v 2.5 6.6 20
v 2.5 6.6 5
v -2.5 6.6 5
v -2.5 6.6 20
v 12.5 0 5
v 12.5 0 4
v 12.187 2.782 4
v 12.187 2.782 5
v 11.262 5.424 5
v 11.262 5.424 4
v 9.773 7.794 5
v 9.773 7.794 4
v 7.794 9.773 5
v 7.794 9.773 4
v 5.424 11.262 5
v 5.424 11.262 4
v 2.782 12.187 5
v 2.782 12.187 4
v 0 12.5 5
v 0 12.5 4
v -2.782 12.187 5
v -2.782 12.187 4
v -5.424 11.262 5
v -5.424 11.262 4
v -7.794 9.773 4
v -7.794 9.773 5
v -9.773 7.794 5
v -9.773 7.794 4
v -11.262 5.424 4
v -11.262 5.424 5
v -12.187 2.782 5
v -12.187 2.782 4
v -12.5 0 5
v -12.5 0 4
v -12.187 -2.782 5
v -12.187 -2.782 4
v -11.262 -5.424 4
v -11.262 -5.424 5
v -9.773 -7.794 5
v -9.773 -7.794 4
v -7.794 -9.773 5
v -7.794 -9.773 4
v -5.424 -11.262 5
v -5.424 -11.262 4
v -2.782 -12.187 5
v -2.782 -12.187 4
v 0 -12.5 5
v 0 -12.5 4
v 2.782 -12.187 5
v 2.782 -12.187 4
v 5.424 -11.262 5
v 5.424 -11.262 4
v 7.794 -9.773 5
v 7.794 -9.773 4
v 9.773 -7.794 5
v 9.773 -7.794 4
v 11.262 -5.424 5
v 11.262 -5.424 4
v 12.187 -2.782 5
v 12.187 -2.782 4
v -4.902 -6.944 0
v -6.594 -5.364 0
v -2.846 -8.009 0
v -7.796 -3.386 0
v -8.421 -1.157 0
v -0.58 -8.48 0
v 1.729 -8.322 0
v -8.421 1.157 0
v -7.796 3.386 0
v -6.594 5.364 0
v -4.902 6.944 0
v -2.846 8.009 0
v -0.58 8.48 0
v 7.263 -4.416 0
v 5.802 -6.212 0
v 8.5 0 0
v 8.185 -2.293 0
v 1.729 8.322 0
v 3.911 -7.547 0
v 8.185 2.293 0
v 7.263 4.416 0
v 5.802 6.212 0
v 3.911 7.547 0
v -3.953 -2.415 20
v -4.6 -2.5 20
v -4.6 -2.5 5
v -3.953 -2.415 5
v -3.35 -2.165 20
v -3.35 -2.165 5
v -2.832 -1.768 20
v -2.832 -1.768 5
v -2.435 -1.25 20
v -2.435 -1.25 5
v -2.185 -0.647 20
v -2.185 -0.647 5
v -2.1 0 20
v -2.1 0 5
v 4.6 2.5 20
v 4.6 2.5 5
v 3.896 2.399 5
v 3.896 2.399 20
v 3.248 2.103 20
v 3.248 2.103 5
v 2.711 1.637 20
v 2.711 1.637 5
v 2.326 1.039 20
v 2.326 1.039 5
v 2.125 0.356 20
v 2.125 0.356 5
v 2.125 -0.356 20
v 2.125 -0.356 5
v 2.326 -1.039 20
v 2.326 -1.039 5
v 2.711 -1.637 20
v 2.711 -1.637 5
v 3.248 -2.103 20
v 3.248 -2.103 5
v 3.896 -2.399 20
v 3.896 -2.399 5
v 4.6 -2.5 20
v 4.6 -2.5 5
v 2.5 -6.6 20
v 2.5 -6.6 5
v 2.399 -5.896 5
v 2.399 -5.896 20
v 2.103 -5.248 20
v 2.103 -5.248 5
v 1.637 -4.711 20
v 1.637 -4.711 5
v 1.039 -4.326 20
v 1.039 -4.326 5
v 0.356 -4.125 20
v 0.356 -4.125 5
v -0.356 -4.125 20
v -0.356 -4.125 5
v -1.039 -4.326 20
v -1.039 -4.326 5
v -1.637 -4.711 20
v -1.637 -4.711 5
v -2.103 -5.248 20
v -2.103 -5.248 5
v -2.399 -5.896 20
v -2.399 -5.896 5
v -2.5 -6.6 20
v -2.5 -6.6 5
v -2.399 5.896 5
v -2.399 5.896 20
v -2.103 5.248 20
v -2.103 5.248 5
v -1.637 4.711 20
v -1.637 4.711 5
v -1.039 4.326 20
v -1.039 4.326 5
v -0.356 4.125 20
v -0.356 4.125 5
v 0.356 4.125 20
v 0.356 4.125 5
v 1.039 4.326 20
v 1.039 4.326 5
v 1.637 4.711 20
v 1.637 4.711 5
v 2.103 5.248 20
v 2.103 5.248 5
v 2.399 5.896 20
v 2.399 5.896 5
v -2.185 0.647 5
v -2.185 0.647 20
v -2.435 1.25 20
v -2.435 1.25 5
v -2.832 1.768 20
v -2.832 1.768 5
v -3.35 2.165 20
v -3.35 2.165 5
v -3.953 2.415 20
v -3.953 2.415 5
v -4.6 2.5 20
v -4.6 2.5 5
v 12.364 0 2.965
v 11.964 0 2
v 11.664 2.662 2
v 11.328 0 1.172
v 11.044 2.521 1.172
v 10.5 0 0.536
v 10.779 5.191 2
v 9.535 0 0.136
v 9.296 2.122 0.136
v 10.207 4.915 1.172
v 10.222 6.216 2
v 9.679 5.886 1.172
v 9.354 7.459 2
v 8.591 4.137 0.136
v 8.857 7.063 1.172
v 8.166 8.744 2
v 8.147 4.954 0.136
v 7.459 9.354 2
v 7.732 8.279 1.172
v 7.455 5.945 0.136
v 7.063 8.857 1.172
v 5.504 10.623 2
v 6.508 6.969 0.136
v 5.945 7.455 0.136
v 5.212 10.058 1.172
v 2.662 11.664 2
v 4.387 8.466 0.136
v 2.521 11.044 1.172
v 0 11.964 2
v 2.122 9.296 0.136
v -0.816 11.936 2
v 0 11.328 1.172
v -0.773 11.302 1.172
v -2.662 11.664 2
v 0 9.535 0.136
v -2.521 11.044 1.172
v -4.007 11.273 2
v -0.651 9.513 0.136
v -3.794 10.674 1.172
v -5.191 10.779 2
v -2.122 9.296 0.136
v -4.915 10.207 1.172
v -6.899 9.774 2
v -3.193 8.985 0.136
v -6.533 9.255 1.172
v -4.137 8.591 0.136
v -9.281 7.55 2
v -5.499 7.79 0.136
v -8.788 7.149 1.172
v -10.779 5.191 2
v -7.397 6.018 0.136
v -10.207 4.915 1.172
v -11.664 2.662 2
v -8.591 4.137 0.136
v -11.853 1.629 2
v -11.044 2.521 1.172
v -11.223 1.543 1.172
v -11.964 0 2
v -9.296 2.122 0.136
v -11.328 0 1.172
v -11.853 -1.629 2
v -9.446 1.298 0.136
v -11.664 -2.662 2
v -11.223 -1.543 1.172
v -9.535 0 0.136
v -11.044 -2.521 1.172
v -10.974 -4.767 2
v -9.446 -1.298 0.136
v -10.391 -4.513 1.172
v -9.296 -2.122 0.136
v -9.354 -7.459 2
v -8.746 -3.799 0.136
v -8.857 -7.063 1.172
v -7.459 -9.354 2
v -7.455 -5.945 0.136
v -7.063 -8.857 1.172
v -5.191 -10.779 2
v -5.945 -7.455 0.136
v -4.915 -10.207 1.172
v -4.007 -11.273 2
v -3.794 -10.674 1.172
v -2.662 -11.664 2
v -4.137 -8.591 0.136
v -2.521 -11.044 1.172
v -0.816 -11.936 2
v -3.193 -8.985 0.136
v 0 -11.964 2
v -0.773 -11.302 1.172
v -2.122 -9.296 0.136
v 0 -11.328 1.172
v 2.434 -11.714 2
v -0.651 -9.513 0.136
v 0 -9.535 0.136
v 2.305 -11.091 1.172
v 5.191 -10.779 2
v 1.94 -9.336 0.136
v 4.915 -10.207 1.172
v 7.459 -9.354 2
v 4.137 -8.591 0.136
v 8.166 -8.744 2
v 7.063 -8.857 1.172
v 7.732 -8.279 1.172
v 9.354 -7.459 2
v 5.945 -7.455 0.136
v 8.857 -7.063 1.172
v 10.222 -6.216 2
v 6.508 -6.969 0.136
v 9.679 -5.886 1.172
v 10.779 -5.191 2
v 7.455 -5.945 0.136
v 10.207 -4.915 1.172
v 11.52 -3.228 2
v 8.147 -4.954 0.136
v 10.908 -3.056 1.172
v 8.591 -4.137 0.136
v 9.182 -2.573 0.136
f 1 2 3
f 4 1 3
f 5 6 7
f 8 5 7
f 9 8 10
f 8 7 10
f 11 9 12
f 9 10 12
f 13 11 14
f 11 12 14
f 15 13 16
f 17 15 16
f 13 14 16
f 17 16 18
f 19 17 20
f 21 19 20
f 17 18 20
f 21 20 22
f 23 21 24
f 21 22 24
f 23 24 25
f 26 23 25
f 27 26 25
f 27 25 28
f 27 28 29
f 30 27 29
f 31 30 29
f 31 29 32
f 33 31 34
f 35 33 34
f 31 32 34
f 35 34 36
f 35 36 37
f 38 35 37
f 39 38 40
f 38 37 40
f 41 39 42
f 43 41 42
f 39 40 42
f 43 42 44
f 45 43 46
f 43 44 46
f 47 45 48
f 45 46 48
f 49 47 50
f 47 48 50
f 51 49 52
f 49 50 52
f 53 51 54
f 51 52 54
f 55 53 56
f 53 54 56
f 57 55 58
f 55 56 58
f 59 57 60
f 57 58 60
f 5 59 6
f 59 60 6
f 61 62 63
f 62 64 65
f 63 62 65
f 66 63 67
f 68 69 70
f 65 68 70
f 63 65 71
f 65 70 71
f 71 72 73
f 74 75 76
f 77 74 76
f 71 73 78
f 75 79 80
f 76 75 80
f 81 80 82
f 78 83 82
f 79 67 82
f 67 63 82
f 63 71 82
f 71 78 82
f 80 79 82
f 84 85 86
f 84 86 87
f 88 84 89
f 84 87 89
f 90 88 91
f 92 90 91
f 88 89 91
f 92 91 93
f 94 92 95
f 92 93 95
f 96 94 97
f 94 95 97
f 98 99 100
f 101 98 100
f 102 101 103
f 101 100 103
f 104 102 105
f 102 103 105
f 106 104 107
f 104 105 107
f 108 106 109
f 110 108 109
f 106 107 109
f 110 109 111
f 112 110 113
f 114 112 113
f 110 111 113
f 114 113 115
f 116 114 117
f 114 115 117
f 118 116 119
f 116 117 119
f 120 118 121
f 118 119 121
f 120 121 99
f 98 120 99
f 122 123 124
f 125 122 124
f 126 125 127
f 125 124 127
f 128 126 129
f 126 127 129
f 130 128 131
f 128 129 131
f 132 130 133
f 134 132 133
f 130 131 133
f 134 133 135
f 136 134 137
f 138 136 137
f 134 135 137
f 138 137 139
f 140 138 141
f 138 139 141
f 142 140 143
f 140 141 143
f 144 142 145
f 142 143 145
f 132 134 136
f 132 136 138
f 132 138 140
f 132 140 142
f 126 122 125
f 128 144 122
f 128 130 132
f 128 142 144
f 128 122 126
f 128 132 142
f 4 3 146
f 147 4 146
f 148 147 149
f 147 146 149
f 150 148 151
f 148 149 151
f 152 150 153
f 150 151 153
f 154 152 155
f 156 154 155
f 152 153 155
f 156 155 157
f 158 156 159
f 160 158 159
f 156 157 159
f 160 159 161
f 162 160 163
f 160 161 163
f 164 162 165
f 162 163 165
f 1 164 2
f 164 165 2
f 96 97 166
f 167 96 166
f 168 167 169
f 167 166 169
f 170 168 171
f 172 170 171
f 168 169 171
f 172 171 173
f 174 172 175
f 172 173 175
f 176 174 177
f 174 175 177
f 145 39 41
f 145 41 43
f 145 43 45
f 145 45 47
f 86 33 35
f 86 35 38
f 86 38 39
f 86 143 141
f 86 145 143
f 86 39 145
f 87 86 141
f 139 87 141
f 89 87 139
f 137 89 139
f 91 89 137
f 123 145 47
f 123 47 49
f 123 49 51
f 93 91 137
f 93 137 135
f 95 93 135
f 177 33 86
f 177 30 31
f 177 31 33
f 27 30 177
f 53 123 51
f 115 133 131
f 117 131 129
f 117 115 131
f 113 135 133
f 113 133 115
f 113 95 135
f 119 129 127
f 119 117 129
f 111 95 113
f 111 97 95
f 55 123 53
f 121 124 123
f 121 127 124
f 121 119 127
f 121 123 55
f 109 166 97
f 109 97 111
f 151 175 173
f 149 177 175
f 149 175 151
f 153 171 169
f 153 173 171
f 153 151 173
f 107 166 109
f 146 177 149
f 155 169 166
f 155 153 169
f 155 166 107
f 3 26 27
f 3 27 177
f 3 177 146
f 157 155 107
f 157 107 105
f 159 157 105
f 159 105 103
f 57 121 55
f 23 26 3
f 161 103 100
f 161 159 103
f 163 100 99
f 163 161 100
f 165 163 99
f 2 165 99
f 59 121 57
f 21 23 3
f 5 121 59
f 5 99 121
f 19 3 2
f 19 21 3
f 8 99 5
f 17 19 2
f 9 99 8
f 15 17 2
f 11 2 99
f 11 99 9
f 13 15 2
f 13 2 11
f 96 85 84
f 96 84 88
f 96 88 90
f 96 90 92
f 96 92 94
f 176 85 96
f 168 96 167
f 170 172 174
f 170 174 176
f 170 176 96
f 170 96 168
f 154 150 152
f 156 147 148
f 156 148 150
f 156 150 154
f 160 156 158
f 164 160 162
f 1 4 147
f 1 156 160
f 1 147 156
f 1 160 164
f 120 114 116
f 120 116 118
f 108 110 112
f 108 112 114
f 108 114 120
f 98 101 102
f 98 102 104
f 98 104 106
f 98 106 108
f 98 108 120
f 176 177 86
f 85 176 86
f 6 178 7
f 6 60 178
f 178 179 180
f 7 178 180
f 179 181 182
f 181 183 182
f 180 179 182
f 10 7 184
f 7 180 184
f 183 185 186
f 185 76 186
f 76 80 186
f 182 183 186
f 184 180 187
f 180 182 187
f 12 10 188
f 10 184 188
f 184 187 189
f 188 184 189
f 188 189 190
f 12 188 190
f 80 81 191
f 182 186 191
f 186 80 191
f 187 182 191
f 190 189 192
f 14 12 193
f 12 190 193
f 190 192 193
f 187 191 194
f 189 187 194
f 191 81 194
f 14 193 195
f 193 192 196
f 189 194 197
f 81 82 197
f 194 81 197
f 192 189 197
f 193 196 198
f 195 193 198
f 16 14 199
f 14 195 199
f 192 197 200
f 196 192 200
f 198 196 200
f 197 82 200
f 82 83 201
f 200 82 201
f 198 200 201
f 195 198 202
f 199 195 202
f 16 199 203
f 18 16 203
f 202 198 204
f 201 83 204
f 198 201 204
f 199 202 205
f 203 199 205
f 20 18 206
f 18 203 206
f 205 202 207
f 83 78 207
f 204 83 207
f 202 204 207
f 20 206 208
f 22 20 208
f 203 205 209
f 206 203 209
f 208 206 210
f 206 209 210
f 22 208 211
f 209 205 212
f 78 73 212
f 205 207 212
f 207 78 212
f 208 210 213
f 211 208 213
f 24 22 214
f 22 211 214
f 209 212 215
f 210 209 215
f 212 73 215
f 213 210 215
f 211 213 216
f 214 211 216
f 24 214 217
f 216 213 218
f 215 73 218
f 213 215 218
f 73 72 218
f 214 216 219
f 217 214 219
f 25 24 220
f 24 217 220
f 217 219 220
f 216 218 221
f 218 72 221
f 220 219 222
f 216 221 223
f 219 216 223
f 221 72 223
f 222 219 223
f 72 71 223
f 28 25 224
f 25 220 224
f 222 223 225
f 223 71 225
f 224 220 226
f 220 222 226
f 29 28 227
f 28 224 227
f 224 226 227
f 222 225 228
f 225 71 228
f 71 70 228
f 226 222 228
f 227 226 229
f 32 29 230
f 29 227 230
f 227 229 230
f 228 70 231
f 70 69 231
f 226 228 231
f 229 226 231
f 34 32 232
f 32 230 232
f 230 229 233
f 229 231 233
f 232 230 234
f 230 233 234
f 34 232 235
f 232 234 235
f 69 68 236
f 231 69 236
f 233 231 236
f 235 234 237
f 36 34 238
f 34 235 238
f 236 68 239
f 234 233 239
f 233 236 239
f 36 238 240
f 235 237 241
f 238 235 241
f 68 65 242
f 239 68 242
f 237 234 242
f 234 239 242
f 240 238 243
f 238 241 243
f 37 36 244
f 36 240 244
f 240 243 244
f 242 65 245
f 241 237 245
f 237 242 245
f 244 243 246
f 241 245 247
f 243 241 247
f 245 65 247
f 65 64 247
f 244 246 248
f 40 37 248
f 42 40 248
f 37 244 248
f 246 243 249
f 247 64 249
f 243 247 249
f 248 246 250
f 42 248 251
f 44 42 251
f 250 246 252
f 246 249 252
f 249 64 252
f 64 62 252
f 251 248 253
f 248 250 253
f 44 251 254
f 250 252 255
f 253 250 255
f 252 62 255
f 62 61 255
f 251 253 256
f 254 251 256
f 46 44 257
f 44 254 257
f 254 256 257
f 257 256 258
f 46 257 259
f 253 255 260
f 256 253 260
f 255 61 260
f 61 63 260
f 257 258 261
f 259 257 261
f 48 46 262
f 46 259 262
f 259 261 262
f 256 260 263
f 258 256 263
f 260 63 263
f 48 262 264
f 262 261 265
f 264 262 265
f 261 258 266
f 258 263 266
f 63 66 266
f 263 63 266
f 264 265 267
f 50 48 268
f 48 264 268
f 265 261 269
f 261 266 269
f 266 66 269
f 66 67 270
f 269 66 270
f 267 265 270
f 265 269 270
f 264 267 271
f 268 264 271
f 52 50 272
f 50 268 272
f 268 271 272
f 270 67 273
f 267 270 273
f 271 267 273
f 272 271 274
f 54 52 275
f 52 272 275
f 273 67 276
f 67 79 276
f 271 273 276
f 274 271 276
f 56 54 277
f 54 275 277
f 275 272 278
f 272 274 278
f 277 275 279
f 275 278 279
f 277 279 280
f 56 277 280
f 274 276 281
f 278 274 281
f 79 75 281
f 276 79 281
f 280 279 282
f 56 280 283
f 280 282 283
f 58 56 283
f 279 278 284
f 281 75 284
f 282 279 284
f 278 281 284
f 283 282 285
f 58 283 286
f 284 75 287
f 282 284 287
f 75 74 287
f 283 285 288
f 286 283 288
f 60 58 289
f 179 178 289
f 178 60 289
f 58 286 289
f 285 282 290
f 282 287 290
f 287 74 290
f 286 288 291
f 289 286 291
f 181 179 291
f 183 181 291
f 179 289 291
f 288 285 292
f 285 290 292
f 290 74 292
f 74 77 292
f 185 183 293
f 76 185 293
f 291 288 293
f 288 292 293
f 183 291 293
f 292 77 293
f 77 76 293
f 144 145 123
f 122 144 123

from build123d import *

# Parameters (mm, degrees)
F0_R     = 12.5
F1_DEPTH = 5
F2_R     = 4
F4_DEPTH = 15


with BuildPart() as f1:
    # F0 (on Top) → F1 (new body)
    with BuildSketch(Plane.XY):
        Circle(F0_R)
    extrude(amount=F1_DEPTH)

    # F2
    f2_edges = [f1.edges().sort_by_distance(p)[0] for p in [
        (-12.5, 0, 0),
    ]]
    fillet(f2_edges, radius=F2_R)

    # F3 (on face) → F4 (join)
    with BuildSketch(Plane.XY.offset(5)):
        with BuildLine():
            Line((-2.5, -6.6), (2.5, -6.6))
            ThreePointArc((2.5, -6.6), (0, -4.1), (-2.5, -6.6))
        make_face()
        with BuildLine():
            ThreePointArc((-2.5, 6.6), (0, 4.1), (2.5, 6.6))
            Line((2.5, 6.6), (-2.5, 6.6))
        make_face()
        with BuildLine():
            ThreePointArc((4.6, 2.5), (2.1, 0), (4.6, -2.5))
            Line((4.6, -2.5), (4.6, 2.5))
        make_face()
        with BuildLine():
            Line((-4.6, 2.5), (-4.6, -2.5))
            ThreePointArc((-4.6, -2.5), (-2.832233047, -1.767766953), (-2.1, 0))
            ThreePointArc((-2.1, 0), (-2.832233047, 1.767766953), (-4.6, 2.5))
        make_face()
    extrude(amount=F4_DEPTH)


solid = f1.part
